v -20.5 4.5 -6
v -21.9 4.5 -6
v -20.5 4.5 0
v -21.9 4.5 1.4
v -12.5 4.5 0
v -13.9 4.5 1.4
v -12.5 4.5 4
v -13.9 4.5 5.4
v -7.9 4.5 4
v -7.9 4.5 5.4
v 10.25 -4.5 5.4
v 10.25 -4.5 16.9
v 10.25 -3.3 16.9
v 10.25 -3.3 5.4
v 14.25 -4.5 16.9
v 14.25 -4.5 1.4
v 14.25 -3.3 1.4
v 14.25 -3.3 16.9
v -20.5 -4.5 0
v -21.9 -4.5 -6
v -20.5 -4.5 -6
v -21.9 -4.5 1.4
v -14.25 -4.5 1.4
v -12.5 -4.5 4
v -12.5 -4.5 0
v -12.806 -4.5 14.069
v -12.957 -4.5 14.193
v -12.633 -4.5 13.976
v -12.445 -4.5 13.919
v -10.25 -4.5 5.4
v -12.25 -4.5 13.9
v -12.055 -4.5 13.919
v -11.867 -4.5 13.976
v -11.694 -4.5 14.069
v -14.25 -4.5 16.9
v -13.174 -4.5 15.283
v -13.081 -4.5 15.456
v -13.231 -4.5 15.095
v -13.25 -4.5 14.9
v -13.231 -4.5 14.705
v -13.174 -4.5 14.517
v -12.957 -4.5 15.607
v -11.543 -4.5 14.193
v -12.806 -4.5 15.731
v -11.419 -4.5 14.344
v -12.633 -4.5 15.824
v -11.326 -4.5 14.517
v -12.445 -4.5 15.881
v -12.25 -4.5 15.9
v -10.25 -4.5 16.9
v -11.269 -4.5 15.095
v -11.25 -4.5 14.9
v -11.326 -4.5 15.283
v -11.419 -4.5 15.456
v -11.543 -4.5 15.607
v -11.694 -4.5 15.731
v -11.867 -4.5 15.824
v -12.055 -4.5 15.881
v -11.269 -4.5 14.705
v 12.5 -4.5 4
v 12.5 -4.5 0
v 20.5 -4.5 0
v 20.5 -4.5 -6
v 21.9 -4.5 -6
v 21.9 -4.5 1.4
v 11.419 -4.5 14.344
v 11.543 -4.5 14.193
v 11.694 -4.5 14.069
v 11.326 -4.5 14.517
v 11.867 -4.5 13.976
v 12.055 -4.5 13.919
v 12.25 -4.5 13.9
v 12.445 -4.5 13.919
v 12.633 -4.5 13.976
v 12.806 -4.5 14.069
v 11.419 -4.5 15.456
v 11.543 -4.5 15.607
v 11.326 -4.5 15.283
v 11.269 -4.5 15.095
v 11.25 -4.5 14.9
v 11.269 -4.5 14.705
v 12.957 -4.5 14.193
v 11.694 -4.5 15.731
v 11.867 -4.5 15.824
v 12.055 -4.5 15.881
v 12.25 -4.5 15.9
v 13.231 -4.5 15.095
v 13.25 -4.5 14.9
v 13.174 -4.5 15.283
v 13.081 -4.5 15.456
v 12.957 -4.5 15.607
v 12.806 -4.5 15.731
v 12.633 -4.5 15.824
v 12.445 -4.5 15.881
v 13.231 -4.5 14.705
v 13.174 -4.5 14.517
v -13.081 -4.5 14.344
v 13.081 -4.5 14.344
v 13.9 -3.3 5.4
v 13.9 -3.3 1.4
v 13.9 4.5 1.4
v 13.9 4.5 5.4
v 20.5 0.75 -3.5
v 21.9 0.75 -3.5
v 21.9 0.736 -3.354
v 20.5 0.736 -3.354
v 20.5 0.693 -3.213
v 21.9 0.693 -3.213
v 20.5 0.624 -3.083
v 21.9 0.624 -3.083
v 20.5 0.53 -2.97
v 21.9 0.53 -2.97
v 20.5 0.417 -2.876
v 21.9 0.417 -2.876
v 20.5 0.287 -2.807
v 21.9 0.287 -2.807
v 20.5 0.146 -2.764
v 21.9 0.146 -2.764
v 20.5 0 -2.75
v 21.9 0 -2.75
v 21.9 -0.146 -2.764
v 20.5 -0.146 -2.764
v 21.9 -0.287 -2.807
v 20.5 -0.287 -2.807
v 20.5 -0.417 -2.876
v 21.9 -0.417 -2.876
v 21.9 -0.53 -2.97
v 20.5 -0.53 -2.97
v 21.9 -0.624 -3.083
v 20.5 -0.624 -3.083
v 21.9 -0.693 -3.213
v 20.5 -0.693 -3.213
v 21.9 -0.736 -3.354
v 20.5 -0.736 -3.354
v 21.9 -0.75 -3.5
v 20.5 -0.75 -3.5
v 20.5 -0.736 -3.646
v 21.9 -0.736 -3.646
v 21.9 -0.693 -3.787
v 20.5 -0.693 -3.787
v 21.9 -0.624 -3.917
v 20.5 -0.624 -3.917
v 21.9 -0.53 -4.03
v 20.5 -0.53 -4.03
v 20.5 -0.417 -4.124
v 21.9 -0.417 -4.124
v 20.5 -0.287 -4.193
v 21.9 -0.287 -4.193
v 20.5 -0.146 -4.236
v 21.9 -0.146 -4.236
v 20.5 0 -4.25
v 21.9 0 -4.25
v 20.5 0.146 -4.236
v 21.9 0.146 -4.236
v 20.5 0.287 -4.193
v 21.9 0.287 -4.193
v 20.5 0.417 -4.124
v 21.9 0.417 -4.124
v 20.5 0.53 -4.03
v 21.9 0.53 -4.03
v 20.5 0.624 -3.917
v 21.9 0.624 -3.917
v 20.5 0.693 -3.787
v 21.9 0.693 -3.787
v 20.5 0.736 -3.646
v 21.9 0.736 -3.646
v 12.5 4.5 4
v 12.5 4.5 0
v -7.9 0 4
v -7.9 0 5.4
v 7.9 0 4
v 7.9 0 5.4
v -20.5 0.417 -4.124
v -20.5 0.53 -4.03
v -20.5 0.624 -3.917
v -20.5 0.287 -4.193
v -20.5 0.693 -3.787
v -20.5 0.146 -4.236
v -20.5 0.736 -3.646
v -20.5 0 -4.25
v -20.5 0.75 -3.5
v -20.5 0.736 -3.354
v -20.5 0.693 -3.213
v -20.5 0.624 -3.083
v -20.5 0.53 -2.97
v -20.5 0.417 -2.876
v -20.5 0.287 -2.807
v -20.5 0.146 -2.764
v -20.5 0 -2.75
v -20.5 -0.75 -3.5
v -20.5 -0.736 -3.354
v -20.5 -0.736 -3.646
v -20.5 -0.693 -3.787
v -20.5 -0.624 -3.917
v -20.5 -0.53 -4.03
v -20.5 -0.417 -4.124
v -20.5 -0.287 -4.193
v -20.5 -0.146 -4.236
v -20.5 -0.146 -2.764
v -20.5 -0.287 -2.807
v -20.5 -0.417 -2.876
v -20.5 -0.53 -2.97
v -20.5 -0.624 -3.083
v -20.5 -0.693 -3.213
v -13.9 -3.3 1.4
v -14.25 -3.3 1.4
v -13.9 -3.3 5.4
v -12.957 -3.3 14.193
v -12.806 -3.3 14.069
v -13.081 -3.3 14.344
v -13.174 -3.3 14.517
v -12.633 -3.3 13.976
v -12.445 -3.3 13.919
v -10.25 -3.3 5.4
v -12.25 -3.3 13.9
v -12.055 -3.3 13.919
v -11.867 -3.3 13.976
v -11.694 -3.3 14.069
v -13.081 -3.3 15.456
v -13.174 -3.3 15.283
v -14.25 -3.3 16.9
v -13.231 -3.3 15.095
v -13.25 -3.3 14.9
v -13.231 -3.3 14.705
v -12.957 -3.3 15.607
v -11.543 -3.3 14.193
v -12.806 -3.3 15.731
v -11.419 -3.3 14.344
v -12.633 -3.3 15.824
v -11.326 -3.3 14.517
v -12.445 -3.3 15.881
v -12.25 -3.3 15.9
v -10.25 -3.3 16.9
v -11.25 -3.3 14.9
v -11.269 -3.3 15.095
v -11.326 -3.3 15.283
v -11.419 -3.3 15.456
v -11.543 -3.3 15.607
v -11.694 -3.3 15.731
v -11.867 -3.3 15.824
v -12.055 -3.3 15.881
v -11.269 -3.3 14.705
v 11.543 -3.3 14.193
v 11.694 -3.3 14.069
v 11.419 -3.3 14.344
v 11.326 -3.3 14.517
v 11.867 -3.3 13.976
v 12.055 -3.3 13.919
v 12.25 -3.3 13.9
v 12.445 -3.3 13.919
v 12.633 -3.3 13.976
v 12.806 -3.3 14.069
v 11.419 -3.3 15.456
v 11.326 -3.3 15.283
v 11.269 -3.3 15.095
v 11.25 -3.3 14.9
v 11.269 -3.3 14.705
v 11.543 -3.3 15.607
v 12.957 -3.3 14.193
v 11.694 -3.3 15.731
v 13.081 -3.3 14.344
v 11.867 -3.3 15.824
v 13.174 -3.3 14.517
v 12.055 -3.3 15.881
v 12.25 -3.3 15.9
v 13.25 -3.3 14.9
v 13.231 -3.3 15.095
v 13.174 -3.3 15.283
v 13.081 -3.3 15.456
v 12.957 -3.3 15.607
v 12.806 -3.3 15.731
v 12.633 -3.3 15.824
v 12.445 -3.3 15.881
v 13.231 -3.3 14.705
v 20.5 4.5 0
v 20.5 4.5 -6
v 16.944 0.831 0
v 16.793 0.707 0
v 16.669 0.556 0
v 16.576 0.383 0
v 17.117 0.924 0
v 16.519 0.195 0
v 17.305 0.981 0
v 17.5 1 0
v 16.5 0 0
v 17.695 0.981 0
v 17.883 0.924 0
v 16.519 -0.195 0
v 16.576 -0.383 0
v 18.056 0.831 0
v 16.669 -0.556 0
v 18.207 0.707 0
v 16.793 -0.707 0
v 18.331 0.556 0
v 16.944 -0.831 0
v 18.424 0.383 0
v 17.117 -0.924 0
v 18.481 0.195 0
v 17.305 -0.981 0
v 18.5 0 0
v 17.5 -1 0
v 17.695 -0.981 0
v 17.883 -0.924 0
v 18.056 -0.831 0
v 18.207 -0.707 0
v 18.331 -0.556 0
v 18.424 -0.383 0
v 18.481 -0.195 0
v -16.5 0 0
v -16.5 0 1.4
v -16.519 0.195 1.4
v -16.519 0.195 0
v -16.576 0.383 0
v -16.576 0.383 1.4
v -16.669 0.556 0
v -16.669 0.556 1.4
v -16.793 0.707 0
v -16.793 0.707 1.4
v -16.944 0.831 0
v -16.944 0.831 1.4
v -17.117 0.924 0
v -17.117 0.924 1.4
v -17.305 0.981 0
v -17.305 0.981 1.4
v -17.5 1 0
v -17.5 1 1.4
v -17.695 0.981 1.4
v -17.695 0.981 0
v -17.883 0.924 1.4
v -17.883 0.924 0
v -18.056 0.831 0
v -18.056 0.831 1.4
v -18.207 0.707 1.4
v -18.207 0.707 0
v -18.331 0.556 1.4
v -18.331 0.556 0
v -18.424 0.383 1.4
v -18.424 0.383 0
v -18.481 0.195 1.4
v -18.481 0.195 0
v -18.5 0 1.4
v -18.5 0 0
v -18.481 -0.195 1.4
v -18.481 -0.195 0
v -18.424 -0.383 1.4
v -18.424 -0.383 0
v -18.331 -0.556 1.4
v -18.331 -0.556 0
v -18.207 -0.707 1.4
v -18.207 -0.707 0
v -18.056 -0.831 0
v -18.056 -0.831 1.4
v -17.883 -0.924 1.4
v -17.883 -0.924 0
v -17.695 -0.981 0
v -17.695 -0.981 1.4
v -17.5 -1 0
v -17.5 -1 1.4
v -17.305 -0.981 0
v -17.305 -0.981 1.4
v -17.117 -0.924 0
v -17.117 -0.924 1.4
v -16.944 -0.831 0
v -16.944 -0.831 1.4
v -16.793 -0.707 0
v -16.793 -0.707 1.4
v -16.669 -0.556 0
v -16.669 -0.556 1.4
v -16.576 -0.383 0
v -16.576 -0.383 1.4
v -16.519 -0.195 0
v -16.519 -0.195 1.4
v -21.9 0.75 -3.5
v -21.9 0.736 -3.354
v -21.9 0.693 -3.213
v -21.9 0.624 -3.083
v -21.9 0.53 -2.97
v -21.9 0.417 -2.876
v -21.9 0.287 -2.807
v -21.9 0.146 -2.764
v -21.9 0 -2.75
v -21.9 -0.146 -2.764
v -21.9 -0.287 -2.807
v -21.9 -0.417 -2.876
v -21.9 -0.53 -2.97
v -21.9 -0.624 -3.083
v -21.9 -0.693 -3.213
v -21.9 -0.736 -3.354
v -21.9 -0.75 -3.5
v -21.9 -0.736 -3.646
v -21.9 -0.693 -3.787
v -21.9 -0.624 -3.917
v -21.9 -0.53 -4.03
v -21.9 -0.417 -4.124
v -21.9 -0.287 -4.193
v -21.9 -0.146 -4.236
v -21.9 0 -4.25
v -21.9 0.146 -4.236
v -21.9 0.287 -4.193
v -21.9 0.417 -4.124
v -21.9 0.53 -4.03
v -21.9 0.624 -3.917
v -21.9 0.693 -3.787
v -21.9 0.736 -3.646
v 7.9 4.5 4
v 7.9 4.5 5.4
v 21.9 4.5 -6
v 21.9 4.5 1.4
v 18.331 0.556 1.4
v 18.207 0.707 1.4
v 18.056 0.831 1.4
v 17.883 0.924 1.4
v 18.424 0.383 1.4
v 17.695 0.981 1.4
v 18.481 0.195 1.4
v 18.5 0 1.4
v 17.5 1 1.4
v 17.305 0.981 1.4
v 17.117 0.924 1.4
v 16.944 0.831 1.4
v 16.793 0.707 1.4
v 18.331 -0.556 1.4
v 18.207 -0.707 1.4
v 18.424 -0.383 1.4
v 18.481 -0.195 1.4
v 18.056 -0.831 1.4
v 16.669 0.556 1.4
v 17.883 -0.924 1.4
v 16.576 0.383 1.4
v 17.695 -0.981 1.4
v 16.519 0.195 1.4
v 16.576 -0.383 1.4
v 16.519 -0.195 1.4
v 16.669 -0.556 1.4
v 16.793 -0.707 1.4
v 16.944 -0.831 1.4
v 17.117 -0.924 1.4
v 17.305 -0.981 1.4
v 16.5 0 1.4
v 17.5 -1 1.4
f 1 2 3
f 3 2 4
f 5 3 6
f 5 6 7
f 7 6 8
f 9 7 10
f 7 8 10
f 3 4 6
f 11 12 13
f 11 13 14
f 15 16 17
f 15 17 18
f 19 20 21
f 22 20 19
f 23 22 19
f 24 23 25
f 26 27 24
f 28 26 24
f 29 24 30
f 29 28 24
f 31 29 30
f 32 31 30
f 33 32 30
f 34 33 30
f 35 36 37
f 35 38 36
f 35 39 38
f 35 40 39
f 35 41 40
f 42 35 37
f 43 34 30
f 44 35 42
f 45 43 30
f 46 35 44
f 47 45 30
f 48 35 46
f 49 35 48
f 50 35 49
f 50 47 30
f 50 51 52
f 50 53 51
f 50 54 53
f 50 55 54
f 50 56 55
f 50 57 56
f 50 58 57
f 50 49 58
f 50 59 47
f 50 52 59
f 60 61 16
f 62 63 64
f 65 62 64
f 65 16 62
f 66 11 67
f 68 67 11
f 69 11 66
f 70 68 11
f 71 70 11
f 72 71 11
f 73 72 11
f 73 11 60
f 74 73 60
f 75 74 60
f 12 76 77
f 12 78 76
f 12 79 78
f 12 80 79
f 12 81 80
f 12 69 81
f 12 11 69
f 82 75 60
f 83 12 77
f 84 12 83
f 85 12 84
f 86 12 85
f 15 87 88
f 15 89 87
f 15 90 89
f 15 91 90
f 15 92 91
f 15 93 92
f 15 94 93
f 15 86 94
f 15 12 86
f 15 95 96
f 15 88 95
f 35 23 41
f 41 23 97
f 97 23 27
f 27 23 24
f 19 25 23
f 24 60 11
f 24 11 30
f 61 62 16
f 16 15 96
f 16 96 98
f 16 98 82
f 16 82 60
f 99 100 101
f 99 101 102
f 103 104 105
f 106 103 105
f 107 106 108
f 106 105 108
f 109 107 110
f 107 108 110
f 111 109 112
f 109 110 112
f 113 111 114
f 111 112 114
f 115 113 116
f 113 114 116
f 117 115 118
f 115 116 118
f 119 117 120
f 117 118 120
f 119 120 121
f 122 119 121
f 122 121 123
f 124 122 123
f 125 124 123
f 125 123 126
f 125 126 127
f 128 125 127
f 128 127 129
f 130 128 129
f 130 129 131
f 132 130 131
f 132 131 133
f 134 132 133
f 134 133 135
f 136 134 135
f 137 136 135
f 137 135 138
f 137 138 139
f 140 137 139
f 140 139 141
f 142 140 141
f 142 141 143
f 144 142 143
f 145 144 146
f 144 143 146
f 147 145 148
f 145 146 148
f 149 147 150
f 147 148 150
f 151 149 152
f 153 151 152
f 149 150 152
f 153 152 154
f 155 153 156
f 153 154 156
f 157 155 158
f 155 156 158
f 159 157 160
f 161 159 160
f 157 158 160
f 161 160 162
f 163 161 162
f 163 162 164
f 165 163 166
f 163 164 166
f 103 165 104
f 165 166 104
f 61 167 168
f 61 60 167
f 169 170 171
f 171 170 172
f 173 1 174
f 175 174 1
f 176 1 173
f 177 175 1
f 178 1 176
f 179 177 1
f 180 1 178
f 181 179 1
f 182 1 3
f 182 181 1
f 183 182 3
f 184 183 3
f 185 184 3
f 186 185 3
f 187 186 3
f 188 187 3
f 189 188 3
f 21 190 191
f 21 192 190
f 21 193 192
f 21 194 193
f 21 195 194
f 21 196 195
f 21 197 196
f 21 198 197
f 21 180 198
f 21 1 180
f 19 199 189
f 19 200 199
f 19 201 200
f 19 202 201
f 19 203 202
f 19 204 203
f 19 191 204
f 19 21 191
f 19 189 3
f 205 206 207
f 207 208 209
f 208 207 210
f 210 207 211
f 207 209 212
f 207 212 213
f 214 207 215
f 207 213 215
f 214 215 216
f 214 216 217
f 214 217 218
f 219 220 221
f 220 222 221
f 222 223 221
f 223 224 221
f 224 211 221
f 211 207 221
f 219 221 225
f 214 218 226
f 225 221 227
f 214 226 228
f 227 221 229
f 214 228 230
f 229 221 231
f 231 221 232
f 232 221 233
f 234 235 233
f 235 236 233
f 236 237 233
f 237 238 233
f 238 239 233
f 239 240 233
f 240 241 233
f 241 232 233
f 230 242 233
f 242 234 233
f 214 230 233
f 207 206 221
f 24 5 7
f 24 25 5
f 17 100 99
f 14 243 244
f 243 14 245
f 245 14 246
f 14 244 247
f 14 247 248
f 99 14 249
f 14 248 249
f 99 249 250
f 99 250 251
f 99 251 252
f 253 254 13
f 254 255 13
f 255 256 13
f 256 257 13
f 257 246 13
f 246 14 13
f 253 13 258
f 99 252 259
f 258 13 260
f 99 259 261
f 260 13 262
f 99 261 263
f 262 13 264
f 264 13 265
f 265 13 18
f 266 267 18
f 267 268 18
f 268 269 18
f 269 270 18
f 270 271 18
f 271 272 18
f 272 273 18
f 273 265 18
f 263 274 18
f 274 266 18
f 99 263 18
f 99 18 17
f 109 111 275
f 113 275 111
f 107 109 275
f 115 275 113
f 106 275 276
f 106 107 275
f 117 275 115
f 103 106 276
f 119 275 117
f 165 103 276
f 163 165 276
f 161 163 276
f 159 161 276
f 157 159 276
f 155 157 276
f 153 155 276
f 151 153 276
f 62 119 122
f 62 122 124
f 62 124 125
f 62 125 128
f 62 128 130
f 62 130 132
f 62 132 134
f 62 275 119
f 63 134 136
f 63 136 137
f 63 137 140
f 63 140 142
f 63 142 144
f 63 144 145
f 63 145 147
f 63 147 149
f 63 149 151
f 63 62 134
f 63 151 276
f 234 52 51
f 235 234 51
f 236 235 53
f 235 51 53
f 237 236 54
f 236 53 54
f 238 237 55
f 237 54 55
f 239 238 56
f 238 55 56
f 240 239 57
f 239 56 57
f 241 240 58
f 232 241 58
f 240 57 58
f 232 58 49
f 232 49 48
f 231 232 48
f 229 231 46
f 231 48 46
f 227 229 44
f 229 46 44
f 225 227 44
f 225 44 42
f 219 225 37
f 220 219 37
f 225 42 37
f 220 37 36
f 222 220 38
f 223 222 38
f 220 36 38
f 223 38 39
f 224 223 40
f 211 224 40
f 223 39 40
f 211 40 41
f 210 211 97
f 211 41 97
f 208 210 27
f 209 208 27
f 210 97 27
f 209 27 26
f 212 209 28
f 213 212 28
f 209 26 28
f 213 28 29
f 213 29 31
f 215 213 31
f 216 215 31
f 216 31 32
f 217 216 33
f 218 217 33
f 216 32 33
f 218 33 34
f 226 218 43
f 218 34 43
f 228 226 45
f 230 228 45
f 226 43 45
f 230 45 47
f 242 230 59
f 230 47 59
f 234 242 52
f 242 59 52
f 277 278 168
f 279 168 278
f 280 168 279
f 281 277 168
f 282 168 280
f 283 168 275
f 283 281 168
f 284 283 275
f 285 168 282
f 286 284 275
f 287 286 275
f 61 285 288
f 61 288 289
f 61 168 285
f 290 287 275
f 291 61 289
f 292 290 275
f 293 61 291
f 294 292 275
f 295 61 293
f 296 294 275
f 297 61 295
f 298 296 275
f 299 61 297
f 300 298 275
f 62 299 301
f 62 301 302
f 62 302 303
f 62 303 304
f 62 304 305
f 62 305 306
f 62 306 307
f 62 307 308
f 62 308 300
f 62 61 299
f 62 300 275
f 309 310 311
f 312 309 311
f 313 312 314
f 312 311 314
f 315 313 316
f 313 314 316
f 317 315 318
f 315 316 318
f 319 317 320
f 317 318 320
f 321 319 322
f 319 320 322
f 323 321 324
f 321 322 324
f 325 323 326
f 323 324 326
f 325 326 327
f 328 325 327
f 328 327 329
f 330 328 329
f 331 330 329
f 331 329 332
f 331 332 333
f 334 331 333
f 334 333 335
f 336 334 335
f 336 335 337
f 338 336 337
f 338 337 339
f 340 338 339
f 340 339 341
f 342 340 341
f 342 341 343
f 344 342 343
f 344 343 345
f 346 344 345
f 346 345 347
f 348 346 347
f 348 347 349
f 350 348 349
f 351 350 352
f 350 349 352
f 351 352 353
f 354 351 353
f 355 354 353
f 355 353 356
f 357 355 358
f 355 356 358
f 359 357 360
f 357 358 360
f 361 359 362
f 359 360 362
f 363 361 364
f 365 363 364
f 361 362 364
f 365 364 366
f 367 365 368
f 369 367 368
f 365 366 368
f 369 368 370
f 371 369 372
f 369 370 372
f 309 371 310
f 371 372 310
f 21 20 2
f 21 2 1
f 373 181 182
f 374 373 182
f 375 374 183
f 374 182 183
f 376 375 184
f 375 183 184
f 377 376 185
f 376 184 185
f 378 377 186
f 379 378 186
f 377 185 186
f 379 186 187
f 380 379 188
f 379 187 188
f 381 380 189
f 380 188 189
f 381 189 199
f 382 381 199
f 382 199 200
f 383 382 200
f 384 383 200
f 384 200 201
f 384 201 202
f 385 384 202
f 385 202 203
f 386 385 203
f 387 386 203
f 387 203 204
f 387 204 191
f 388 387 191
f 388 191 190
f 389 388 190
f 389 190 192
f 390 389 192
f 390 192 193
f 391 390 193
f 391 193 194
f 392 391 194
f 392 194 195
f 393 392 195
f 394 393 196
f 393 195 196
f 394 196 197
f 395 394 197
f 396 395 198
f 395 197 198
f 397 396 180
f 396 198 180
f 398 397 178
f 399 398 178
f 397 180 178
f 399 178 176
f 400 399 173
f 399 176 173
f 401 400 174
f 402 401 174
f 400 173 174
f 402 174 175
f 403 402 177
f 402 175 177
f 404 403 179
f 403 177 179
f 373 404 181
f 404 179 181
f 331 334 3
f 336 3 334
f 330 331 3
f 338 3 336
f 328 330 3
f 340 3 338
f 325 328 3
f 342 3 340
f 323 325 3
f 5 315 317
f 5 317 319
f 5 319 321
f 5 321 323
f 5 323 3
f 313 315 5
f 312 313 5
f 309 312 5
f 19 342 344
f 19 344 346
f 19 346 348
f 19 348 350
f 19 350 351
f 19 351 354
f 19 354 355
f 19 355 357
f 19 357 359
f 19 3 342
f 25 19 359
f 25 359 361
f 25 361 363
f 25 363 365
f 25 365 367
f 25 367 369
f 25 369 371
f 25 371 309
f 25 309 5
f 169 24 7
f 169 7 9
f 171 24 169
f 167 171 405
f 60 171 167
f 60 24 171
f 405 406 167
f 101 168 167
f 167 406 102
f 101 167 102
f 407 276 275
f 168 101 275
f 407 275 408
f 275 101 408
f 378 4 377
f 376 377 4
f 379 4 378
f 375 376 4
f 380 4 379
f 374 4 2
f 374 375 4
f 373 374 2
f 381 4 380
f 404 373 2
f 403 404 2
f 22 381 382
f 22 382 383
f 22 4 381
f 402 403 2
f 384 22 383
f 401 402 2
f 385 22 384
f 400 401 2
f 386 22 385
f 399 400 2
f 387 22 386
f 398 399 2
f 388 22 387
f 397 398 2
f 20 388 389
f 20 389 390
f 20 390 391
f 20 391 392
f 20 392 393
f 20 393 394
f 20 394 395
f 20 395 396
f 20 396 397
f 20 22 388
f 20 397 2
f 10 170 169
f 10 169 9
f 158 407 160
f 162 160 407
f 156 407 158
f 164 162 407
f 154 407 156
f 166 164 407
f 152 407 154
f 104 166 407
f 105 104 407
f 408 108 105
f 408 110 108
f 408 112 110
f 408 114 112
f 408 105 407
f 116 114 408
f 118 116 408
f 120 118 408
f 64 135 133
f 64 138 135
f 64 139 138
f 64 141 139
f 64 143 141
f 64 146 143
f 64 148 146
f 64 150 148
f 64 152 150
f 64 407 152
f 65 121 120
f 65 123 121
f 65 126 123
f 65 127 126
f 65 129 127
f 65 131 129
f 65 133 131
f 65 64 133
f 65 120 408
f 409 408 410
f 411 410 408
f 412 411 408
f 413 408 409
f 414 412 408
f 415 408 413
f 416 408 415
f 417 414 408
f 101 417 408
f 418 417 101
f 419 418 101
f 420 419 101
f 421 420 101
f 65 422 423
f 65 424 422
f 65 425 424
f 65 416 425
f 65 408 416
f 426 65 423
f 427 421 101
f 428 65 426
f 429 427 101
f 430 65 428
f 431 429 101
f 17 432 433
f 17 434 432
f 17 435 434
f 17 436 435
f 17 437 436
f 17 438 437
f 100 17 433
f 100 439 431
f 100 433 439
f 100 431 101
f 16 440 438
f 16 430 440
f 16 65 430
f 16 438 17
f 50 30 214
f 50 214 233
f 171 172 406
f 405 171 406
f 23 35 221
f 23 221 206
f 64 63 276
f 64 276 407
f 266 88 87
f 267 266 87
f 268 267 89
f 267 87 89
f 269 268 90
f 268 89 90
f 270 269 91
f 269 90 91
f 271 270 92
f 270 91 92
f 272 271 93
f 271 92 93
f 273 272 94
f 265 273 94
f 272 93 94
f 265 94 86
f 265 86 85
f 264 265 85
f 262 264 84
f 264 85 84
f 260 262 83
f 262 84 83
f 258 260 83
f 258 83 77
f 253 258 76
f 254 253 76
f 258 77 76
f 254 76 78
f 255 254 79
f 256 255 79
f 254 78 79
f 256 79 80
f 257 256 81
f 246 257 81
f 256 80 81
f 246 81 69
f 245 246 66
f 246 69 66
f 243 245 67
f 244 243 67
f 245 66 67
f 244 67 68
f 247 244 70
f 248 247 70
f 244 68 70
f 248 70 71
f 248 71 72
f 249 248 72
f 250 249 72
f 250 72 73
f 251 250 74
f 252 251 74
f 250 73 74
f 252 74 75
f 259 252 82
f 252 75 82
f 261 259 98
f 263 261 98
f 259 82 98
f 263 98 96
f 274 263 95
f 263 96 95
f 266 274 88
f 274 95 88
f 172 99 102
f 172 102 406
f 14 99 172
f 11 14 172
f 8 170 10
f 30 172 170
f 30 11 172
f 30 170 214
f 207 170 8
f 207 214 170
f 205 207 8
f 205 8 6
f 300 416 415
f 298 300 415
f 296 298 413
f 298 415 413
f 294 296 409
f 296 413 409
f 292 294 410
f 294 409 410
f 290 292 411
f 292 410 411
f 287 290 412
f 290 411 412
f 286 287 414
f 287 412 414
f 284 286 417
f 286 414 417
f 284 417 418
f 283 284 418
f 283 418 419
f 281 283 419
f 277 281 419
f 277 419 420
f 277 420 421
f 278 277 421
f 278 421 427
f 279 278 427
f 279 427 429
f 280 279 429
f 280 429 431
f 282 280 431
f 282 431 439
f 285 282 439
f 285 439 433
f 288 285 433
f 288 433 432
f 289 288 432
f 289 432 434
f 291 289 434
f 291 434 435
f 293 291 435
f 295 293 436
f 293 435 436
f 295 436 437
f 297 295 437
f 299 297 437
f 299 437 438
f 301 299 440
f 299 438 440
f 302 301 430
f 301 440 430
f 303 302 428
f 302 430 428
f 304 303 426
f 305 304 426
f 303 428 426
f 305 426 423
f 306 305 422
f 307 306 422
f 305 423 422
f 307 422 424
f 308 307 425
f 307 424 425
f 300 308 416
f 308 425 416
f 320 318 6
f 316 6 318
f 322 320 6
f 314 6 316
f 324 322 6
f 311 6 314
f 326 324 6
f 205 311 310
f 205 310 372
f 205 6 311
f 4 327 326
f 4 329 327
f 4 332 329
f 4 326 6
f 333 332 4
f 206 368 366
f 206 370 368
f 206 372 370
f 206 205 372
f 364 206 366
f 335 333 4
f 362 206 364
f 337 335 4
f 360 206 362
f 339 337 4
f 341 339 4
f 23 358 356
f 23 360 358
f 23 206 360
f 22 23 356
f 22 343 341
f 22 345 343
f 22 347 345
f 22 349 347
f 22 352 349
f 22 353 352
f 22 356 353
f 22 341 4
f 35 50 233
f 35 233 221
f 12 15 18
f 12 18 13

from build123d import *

# Parameters (mm, degrees)
F1_DEPTH = 4.5
F2_R     = 0.75
F3_DEPTH = 43.801
F4_R     = 1
F5_DEPTH = 1.2
F6_R     = 1
F6_W     = 15.8
F6_H     = 4.5
F7_DEPTH = 11.401


with BuildPart() as f1:
    # F0 (on Front) → F1 (new body, symmetric)
    with BuildSketch(Plane.XZ):
        Polygon((12.5, 4), (12.5, 0), (20.5, 0), (20.5, -6), (21.9, -6), (21.9, 1.4), (13.9, 1.4), (13.9, 5.4), (-13.9, 5.4), (-13.9, 1.4), (-21.9, 1.4), (-21.9, -6), (-20.5, -6), (-20.5, 0), (-12.5, 0), (-12.5, 4), align=None)
    extrude(amount=F1_DEPTH, both=True)

    # F2 (on face) → F3 (cut, through all)
    with BuildSketch(Plane.YZ.offset(21.9)):
        with Locations((0, -3.5)):
            Circle(F2_R)
    extrude(amount=-F3_DEPTH, mode=Mode.SUBTRACT)

    # F4 (on face) → F5 (join)
    with BuildSketch(Plane.XZ.offset(4.5)):
        Polygon((14.25, 16.9), (10.25, 16.9), (10.25, 5.4), (13.9, 5.4), (13.9, 1.4), (14.25, 1.4), align=None)
        with Locations((12.25, 14.9)):
            Circle(F4_R, mode=Mode.SUBTRACT)
        Polygon((-10.25, 16.9), (-14.25, 16.9), (-14.25, 1.4), (-13.9, 1.4), (-13.9, 5.4), (-10.25, 5.4), align=None)
        with Locations((-12.25, 14.9)):
            Circle(F4_R, mode=Mode.SUBTRACT)
    extrude(amount=-F5_DEPTH)

    # F6 (on face) → F7 (cut, through all)
    with BuildSketch(Plane.XY.offset(5.4)):
        with Locations((-17.5, 0)):
            Circle(F6_R)
        with Locations((17.5, 0)):
            Circle(F6_R)
        with Locations((0, 2.25)):
            Rectangle(F6_W, F6_H)
    extrude(amount=-F7_DEPTH, mode=Mode.SUBTRACT)


solid = f1.part
